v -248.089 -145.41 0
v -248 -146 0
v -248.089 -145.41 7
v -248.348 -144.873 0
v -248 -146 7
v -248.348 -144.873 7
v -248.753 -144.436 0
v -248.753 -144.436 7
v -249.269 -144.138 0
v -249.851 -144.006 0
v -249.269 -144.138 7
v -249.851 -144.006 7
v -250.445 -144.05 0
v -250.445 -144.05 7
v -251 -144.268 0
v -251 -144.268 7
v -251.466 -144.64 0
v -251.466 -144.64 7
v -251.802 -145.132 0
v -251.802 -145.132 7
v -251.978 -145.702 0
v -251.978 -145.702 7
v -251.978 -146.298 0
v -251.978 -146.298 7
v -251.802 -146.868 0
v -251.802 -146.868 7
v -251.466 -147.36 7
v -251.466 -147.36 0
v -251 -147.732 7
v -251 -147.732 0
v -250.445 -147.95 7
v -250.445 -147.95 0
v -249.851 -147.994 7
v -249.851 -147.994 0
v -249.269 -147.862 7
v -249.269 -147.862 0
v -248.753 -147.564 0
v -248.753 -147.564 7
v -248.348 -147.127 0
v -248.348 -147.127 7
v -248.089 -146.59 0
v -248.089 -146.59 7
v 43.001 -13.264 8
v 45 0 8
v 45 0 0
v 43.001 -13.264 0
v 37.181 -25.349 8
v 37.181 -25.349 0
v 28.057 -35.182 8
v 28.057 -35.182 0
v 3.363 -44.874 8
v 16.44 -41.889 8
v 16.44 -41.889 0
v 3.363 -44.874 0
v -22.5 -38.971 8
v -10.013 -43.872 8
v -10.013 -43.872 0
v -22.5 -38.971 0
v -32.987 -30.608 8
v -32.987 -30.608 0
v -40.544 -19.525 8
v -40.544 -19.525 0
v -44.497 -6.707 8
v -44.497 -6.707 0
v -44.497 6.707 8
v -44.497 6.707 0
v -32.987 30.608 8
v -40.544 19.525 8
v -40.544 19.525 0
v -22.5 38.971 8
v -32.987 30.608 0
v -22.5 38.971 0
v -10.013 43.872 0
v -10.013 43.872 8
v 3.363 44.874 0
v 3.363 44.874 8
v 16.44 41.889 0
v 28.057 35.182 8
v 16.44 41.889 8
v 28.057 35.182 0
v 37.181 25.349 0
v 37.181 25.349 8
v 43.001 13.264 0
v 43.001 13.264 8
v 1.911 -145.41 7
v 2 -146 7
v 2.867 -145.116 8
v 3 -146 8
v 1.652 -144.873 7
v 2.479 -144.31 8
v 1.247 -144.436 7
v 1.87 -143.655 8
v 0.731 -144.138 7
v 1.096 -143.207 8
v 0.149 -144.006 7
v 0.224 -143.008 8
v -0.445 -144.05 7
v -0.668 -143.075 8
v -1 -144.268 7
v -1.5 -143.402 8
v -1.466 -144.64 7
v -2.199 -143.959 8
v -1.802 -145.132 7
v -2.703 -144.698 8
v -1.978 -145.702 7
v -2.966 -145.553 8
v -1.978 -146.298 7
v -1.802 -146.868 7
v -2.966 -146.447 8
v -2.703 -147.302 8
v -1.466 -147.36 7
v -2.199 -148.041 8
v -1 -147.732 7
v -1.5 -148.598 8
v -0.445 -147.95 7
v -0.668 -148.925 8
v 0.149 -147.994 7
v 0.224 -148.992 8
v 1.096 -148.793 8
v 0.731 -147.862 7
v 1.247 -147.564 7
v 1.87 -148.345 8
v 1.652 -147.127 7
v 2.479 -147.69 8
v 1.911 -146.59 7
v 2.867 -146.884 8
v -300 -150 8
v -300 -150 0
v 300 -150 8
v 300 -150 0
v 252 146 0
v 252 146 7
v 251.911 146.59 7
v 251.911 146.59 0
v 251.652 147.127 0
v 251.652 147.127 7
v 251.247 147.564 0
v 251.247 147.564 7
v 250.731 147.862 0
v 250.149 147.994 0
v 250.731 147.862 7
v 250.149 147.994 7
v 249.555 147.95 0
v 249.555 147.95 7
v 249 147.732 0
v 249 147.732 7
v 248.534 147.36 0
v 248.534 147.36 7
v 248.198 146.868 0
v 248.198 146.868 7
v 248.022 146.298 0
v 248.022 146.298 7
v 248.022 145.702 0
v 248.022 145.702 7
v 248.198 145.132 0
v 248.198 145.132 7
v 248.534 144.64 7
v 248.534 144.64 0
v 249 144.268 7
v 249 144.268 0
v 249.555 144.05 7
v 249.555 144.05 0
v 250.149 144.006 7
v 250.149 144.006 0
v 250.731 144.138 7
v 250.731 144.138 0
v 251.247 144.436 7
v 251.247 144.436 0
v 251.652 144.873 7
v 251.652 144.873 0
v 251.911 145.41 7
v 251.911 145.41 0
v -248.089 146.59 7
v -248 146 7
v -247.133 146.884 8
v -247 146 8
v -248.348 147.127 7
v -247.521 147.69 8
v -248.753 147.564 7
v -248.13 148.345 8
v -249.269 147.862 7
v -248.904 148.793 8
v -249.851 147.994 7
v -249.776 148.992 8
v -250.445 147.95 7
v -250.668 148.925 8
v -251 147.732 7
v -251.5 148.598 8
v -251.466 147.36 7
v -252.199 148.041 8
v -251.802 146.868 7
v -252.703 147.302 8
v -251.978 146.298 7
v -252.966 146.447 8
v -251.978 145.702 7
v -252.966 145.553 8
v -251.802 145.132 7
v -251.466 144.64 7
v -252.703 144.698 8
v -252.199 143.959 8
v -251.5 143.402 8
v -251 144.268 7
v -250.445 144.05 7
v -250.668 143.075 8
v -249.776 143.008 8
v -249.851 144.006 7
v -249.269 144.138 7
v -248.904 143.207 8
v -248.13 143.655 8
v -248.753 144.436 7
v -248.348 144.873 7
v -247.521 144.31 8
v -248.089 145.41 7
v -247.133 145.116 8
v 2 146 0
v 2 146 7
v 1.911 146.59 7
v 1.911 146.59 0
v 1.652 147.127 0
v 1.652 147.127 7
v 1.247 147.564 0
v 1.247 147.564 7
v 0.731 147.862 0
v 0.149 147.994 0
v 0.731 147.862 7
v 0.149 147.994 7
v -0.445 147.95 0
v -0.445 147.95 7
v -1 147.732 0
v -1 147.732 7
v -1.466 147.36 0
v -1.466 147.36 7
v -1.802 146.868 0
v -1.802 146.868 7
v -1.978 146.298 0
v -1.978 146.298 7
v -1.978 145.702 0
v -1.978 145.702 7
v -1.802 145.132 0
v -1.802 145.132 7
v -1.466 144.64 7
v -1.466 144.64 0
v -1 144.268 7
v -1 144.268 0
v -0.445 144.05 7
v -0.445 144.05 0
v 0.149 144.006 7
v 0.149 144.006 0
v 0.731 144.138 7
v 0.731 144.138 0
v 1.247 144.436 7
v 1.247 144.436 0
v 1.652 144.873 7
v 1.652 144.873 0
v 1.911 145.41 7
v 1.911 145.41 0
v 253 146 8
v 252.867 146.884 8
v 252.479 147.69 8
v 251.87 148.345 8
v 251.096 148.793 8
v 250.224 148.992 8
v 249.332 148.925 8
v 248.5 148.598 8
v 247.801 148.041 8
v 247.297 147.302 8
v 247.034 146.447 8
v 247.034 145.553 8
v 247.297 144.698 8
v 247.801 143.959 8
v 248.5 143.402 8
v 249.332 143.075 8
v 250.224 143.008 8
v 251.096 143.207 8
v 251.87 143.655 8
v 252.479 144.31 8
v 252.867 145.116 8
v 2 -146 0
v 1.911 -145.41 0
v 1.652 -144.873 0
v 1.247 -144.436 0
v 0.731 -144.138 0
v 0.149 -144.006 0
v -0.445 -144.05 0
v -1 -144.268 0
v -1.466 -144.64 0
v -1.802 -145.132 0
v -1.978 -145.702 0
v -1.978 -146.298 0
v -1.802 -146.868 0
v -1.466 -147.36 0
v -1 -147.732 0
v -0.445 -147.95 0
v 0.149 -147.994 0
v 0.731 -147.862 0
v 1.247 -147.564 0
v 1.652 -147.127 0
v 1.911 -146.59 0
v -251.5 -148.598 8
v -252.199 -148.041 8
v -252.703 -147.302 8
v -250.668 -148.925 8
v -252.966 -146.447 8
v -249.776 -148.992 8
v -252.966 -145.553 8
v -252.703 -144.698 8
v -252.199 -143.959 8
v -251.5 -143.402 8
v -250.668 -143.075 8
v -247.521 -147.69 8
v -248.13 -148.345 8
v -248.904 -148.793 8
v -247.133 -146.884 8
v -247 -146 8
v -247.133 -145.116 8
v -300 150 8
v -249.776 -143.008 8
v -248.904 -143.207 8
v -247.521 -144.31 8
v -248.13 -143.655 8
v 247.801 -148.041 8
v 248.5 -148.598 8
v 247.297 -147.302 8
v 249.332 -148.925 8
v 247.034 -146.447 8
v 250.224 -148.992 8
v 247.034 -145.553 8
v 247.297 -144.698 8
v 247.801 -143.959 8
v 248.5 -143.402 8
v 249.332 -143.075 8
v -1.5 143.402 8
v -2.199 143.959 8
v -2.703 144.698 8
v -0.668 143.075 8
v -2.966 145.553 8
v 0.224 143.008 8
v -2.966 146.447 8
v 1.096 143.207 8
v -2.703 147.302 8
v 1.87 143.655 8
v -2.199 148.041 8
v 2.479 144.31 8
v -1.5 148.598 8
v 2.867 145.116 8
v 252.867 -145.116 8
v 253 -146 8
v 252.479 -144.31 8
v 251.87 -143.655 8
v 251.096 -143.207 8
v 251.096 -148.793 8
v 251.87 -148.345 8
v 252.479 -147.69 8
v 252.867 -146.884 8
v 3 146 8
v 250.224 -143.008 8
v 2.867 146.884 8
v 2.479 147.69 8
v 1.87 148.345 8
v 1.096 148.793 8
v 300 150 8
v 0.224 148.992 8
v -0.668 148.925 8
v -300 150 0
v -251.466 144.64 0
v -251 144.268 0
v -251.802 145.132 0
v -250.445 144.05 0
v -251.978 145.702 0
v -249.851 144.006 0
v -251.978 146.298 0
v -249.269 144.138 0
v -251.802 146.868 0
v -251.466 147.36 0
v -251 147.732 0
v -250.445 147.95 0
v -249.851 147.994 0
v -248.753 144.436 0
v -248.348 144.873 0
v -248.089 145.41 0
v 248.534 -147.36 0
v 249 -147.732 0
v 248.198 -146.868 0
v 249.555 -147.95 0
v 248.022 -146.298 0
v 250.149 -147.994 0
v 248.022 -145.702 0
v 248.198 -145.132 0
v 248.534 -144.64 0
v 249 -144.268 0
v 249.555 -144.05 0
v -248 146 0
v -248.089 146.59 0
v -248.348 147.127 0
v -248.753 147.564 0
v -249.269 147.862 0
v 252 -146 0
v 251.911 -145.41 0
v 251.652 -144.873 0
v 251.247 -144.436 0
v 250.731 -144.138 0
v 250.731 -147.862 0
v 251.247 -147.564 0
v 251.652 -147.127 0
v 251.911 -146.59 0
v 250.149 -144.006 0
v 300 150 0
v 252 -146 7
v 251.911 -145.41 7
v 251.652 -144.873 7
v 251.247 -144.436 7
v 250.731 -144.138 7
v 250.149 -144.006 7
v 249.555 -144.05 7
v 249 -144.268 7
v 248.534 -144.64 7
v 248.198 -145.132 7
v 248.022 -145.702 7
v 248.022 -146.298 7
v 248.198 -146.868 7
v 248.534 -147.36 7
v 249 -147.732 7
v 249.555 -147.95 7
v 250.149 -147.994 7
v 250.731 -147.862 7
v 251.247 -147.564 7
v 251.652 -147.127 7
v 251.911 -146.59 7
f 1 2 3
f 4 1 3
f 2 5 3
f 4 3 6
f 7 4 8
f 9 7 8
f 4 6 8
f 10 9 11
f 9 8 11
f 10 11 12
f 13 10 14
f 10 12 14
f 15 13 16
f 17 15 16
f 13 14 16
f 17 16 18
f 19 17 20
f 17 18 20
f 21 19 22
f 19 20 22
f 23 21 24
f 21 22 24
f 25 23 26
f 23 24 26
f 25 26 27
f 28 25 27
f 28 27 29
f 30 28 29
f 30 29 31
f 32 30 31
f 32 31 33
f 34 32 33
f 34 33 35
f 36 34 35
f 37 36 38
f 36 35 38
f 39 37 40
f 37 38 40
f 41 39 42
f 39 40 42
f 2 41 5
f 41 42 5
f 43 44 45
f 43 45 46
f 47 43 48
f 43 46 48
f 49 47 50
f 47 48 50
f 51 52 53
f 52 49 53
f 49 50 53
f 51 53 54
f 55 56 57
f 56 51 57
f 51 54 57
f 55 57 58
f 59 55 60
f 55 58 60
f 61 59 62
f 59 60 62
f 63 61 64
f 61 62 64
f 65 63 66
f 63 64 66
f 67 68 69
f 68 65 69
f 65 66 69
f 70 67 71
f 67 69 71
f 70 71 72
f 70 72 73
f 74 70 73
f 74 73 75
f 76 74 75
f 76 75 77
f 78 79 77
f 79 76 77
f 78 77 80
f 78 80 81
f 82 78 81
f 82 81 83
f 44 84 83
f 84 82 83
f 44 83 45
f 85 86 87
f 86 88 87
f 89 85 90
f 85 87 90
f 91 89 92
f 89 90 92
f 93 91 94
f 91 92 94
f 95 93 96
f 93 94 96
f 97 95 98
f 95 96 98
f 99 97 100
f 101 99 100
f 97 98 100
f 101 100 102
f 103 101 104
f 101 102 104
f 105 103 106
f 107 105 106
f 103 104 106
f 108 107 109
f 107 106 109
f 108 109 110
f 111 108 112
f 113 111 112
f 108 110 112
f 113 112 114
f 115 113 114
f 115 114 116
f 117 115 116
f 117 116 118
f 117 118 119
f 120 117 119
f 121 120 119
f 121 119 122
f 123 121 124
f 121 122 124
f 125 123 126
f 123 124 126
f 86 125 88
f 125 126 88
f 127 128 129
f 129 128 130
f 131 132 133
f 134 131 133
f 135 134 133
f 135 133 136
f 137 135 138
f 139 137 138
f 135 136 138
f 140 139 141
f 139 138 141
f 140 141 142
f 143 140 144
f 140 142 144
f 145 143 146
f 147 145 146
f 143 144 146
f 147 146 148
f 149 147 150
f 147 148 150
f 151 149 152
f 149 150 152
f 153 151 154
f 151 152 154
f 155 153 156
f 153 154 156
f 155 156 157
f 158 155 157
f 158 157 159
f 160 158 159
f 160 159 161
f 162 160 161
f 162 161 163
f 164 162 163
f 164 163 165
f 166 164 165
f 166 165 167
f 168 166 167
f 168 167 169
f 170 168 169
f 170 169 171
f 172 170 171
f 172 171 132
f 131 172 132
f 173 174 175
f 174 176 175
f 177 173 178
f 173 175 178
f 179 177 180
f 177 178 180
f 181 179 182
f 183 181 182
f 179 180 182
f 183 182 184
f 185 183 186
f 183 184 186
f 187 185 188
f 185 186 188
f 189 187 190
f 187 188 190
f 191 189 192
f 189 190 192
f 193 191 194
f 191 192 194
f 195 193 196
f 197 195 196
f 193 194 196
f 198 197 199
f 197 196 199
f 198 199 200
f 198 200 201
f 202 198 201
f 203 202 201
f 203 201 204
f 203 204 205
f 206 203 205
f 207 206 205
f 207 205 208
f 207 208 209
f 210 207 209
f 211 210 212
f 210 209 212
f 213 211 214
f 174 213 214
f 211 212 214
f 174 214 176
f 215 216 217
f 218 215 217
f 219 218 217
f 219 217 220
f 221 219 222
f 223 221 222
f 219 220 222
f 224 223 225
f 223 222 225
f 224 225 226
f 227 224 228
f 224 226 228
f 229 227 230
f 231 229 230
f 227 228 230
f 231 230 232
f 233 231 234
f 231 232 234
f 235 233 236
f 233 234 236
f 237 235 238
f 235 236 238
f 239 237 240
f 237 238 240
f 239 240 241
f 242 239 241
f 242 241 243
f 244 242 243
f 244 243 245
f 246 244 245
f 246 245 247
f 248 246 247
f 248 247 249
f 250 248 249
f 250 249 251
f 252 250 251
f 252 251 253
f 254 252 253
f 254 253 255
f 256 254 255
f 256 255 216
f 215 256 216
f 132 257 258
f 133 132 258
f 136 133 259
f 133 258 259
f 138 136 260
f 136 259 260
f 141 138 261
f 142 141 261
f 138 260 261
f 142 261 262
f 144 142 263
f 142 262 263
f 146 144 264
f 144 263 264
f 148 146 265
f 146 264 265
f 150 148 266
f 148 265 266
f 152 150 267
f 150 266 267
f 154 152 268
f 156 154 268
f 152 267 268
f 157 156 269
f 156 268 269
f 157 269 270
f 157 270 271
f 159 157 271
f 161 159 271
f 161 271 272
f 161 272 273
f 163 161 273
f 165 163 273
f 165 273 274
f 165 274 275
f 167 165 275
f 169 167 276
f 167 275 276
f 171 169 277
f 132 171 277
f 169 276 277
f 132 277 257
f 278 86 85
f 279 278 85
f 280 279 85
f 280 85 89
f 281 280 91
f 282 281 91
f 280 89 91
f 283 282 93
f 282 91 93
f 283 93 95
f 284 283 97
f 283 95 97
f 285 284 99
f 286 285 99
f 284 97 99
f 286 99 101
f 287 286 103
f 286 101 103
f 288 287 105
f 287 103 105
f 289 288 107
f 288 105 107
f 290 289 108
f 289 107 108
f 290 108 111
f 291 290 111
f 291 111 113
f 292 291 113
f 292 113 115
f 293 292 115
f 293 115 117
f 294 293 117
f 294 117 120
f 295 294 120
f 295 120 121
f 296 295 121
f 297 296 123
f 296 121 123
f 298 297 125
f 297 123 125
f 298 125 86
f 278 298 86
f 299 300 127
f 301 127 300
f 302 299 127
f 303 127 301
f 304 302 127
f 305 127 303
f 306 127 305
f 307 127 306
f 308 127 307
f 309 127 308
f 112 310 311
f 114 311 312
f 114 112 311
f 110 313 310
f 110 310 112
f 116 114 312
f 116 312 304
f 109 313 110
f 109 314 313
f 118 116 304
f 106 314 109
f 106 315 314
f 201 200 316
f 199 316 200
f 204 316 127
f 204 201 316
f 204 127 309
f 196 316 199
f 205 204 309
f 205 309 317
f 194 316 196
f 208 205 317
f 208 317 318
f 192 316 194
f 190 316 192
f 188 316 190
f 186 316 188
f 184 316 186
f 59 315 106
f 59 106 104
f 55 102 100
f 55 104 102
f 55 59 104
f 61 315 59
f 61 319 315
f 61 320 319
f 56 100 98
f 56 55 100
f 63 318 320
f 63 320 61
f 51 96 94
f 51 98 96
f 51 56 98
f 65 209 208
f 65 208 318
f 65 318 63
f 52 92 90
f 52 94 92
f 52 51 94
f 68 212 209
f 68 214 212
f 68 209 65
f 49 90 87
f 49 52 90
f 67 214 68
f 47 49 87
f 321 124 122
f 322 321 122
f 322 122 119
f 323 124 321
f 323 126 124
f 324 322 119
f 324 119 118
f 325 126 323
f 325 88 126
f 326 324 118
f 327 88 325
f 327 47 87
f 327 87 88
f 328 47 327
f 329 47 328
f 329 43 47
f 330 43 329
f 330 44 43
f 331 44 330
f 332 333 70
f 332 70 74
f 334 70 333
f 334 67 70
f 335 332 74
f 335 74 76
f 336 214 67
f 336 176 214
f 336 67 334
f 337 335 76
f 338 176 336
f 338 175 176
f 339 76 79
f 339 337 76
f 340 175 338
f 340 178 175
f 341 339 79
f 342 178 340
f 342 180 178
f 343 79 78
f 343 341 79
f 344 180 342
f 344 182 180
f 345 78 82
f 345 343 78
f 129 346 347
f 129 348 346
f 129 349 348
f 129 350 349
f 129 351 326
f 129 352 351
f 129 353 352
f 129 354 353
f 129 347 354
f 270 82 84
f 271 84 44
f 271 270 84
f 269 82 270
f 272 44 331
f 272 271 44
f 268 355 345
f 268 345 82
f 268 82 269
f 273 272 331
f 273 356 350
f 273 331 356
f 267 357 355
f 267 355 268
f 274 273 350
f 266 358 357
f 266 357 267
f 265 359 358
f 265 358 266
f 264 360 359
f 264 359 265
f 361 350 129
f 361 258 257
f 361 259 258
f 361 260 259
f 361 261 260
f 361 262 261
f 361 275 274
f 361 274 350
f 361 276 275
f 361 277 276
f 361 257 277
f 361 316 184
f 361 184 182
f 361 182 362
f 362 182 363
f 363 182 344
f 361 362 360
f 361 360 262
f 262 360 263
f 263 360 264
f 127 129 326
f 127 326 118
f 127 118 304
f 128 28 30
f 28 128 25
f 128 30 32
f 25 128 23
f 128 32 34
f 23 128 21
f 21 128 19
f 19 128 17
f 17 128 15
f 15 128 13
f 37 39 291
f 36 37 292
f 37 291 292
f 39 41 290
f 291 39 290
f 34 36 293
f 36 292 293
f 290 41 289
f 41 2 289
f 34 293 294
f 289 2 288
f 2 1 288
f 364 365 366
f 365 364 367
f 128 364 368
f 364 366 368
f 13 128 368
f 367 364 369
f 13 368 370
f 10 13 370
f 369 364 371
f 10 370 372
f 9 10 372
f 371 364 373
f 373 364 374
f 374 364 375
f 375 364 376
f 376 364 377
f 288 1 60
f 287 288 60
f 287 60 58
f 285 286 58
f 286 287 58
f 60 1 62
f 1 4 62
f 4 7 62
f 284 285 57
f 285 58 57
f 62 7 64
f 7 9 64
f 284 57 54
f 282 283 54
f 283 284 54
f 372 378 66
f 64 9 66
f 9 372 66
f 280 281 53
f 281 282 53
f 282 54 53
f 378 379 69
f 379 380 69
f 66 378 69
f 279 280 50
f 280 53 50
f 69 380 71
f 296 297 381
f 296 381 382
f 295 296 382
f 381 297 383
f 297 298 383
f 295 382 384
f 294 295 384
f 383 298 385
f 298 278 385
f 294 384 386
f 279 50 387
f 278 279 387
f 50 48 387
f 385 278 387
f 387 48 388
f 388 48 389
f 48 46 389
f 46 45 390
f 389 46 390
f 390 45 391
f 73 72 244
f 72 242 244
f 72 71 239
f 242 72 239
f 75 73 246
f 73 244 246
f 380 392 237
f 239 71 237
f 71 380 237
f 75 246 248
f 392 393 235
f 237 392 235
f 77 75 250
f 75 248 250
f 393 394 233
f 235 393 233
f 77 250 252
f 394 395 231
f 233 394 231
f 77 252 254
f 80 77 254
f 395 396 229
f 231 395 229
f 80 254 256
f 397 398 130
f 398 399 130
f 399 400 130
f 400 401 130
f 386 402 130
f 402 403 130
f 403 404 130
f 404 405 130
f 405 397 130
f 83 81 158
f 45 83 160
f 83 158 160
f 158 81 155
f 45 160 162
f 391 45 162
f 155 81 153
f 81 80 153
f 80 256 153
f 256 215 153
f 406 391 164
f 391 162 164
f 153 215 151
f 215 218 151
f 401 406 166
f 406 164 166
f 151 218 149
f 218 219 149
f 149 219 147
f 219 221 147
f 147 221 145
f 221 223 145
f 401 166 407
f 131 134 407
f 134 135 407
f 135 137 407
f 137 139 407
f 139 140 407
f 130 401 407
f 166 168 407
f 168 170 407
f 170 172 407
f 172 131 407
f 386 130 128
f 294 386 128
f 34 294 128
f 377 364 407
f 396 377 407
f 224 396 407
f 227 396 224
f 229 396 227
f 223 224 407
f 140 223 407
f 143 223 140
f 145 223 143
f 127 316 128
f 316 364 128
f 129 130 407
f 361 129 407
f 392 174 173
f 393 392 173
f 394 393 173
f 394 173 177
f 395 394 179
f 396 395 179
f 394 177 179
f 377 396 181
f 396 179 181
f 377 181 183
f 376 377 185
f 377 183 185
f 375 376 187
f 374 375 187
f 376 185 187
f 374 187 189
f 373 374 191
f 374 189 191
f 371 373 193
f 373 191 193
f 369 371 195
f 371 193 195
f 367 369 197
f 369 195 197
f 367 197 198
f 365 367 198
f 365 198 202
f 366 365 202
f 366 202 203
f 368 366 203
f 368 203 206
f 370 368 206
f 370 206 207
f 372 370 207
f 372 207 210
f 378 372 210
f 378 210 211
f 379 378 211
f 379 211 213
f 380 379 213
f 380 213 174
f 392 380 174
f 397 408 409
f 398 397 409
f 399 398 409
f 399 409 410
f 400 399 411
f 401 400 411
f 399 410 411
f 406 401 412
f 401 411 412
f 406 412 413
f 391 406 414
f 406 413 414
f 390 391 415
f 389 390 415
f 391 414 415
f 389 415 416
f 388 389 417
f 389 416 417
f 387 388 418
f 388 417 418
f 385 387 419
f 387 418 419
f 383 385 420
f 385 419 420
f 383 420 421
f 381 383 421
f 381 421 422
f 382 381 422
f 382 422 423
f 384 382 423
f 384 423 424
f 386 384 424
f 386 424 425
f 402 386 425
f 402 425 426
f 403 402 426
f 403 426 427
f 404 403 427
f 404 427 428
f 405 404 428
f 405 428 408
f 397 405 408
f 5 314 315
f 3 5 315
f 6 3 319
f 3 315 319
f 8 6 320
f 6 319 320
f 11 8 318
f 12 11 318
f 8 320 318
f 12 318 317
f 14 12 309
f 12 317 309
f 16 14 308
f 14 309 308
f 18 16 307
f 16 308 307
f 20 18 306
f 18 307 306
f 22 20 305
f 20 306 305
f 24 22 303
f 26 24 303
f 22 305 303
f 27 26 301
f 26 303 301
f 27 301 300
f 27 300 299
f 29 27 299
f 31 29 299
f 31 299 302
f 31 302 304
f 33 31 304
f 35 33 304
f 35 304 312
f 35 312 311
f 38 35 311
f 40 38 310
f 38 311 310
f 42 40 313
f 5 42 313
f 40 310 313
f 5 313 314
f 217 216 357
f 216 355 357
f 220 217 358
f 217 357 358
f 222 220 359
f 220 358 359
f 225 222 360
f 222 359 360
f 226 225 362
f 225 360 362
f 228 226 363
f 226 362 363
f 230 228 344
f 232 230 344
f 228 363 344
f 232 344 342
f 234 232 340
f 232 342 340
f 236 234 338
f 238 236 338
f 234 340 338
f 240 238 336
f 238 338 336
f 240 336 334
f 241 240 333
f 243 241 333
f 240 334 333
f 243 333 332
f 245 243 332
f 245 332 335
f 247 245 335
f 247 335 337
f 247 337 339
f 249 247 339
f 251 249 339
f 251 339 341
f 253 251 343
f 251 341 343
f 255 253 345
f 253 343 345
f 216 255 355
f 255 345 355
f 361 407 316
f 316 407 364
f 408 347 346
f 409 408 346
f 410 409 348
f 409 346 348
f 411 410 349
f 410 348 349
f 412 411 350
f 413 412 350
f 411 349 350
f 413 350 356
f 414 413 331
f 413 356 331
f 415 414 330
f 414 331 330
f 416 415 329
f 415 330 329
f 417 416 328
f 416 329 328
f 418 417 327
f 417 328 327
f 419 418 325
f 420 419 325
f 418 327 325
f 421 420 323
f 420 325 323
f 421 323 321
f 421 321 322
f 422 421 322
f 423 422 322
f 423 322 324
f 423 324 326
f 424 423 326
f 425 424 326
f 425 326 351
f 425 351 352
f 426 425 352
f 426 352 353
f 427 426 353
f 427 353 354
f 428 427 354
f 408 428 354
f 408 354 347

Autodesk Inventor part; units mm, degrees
ref_plane "YZ Plane" through (0, 0, 0) normal (1, 0, 0) x (0, 1, 0)
ref_plane "XZ Plane" through (0, 0, 0) normal (0, 1, 0) x (-1, 0, 0)
ref_plane "XY Plane" through (0, 0, 0) normal (0, 0, 1) x (1, 0, 0)
sketch "Esboço1" plane through (0, 0, 0) normal (0, 0, 1) x (1, 0, 0)
  line L0 (-300, -150) -> (300, -150)
  line L1 (300, -150) -> (300, 150)
  line L2 (300, 150) -> (-300, 150)
  line L3 (-300, 150) -> (-300, -150)
  line L4 (-300, -150) -> (300, 150) construction
  line L5 (300, -150) -> (-300, 150) construction
  circle A0 centre (0, 0) radius 45
  dimension "d0" = 600
  dimension "d1" = 300
  dimension "d2" = 90
extrude "Extrusão1" add sketch "Esboço1" along normal blind 8
sketch "Esboço2" plane through (0, 0, 8) normal (0, 0, 1) x (1, 0, 0)
  line L0 (-250, -146) -> (250, 146) construction
  line L1 (250, -146) -> (-250, 146) construction
  circle A0 centre (-250, 146) radius 2
  circle A1 centre (0, 146) radius 2
  circle A2 centre (250, 146) radius 2
  circle A3 centre (250, -146) radius 2
  circle A4 centre (0, -146) radius 2
  circle A5 centre (-250, -146) radius 2
  point P0 (0, 0)
  dimension "d5" = 292
  dimension "d7" = 4
  dimension "d8" = 4
  dimension "d9" = 4
  dimension "d10" = 4
  dimension "d11" = 4
  dimension "d12" = 4
extrude "Extrusão2" cut sketch "Esboço2" against normal blind 10
chamfer "Chanfro1" distance 1 angle 45 6 edges at (-252, 146, 8) (-2, 146, 8) (248, 146, 8) (248, -146, 8) (-2, -146, 8) (-252, -146, 8)
properties part number "base-inferior"
